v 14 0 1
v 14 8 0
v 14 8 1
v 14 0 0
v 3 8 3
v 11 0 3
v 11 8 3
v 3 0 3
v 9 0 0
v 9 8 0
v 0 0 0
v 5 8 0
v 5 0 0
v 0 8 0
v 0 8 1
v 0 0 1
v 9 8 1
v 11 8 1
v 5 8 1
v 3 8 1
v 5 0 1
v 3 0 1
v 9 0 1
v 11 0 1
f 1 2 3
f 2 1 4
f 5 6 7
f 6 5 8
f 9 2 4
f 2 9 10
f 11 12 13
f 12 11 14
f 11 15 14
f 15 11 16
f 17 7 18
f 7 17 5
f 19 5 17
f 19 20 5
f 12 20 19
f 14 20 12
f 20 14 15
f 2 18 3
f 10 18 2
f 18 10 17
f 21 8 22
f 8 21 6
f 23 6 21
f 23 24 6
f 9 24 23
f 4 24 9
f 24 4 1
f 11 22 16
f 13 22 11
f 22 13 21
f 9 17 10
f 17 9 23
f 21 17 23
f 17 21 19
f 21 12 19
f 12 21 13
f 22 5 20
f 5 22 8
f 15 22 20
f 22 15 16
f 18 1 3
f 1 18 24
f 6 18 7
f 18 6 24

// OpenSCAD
difference(){
    cube([14,8,3]);
    translate([5,-1,-1])
        cube([4,10,2]);
    translate([-1,-1,1])
        cube([4,10,3]);
    translate([11,-1,1])
        cube([4,10,3]);
}
